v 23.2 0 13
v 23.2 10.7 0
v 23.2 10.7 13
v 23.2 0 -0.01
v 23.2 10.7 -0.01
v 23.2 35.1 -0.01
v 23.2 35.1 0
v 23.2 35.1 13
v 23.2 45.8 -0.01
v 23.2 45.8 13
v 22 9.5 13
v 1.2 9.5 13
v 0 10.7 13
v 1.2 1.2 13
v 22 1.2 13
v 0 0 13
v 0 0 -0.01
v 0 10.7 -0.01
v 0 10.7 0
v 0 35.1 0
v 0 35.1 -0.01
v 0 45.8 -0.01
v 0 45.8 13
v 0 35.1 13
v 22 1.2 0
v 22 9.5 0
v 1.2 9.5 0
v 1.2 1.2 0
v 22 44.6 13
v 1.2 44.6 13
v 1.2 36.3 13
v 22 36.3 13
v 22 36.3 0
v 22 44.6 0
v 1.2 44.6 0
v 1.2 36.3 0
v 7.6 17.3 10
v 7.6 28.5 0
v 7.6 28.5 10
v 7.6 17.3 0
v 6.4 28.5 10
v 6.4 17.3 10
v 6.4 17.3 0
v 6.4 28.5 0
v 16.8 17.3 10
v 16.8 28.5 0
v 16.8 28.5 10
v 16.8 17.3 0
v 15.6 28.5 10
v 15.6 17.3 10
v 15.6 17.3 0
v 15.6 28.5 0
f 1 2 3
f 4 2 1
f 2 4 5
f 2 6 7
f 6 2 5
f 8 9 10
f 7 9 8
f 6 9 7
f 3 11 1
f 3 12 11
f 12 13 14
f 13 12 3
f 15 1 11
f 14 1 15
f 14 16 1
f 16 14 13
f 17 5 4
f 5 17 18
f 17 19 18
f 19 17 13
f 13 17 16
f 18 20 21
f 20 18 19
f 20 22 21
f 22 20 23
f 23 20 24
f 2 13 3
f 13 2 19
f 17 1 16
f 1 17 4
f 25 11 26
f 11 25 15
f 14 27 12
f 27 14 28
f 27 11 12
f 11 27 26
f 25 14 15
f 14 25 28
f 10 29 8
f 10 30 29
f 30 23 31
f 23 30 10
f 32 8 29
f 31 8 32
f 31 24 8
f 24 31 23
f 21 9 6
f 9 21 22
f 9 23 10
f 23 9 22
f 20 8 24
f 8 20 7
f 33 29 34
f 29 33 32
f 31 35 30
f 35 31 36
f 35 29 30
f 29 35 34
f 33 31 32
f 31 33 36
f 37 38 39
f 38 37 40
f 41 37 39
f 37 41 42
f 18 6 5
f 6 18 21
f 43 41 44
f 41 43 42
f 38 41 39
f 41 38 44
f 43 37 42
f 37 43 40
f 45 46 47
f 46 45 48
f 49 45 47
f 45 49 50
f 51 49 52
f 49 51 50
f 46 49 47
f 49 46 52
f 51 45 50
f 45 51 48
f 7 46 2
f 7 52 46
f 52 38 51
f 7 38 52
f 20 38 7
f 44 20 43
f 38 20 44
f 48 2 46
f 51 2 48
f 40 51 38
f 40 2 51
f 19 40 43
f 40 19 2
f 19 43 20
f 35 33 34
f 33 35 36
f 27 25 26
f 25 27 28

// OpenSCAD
// file: ../Base/Boxes.scad
// Fischertechnik Box Foundation
// Pre-designed Boxes

use <Constants.scad>

include <PlacementOptions.scad>

box190Width = 190;
box190Depth = 130;
box130Width = 130;
box130Depth = 95;
boxUsageHeight = 33.9;
boxWallThickness = 2.4;
boxBaseThickness = 1.0;

// getBoxWallThickness()
// Gets the wall thickness of a Fischertechnik Box

function getBoxWallThickness() = boxWallThickness;

// Gets the usable height of a fischertechnik box
function getBoxUsageHeight() = boxUsageHeight;

// Gets the thickness of the Fischertechnik box base.
function getBoxBaseThickness() = boxBaseThickness;

// Gets the usable inner space of a Box 190 as an x/y-list
function getBox190Space() = [
    box190Width - 2*getBoxWallThickness(), 
    box190Depth - 2*getBoxWallThickness() ];

// Imports the Fischertechnik empty box 130x190 mm and places it at position 0,0
// 190x130 are the outer sizes, the inner space is slightly smaller. Use getBox190Space() to get the inner sizes.
// This module needs the STL file "Fischertechnik Box 130x190.stl" in the library path.
// The box is positioned that the usable inner space is at the 0,0,0 position. The

module Box190() {
    translate([-getBoxWallThickness(),-getBoxWallThickness(),-getBoxBaseThickness()])
        import("Fischertechnik Box 130x190.stl", convexity=3);
}

// Gets the usable inner space of a Box 130 as an x/y-list
function getBox130Space() = [
    box130Width - 2*getBoxWallThickness(), 
    box130Depth - 2*getBoxWallThickness() ];

// Imports the Fischertechnik empty box 95x130 mm and places it at position 0,0
// 190x130 are the outer sizes, the inner space is slightly smaller. Use getBox190Space() to get the inner sizes.
// This module needs the STL file "Fischertechnik Box 95x130.stl" in the library path.
// The box is positioned that the usable inner space is at the 0,0,0 position. The

module Box130() {
    translate([-getBoxWallThickness(),-getBoxWallThickness(),-getBoxBaseThickness()])
        import("Fischertechnik Box 95x130.stl", convexity=3);
}

// Creates a web at the specified box walls
// corner 0 = LowerLeft, 1 = UpperLeft, 2 = UpperRight, 3 = LowerRight
// side 0 = LeftOfCorner, 1 = RightOfCorner
// distance = Distance in mm from the corner
// box = inner width and depth of the box (default: Box 190)
// webWidth = length of the web (default is 3 mms)
// webThickness = thickness of the web (default is 1 mm)

module BoxWeb(corner, side, distance, box=getBox190Space(), webWidth=3, webThickness=1.0) {
    sink = getBoxWallThickness()/2;

    width = (corner % 2 == 0) ? 
            (side == LeftOfCorner ? webWidth : webThickness) :
            (side == LeftOfCorner ? webThickness : webWidth);

    depth = (corner % 2 == 0) ? 
            (side == RightOfCorner ? webWidth : webThickness) :
            (side == RightOfCorner ? webThickness : webWidth);
    
    xDiff = corner == LowerLeft ? 
                (side == LeftOfCorner ? -sink : distance) :
            (corner == UpperLeft ?                
                (side == LeftOfCorner ? distance : -sink) :
            (corner == UpperRight ?
                (side == LeftOfCorner ? box.x-webWidth+sink : box.x-distance-webThickness) :
                (side == LeftOfCorner ? box.x-distance-webThickness: box.x-webWidth+sink)));

    yDiff = corner == LowerLeft ? 
                (side == RightOfCorner ? -sink : distance) :
            (corner == UpperLeft ?
                (side == RightOfCorner ? box.y-distance : box.y-webWidth+sink) :
            (corner == UpperRight ?
                (side == RightOfCorner ? box.y-webWidth+sink : box.y-distance) :
                (side == RightOfCorner ? distance : -sink)));
    
    translate([xDiff, yDiff, -getExcess()])
        cube([width, depth, boxUsageHeight + 2*getExcess()]);
}
// file: ../Base/Rotation.scad
// Fischertechnik Box Foundation
// Geometry Helpers Rotation

include <PlacementOptions.scad>

// getRotatedSpace(space, rotation=NoRotation)
// Rotates the space dependent on the specified rotation

function getRotatedSpace(space, rotation=NoRotation) = [
    (rotation == Rotate90 || rotation == Rotate270) ? space.y : space.x,
    (rotation == Rotate90 || rotation == Rotate270) ? space.x : space.y
];

// Rotates the given space around the fixed left lower corner
// space = the space the children needs as width/depth list [width,depth]
// rotation = 0 Rotate0 degrees, 1 Rotate90 degrees, 2 Rotate180 degrees, 3 Rotate270 degrees (equivalent to -90)

module RotateFix(space, rotation=Rotate0) {
    dy = (rotation == Rotate0 || rotation == Rotate270) ? 0 :
        (rotation == Rotate90) ? space.x :
        space.y;
    dx = (rotation < Rotate180) ? 0 :
        (rotation == Rotate180) ? space.x :
        space.y;
    
    translate([dx, dy, 0])
        rotate([0, 0, rotations[rotation]])
            children();
}
// file: ../Base/Alignment.scad
// Fischertechnik Box Foundation
// Geometry Helpers Alignment

include <PlacementOptions.scad>

// getAlignedX(elementWidth, spaceWidth, align=AlignRight, offset=0)
// Gets the aligned X offset of an element with the given
// width in the given space.
// elementWidth = The width of the element to positon
// spaceWidth = The space where the element should be aligned
// align = 0 AlignLeft, 1 AlignCenter, 2 AlignRight
// offset = an optional offset from the aligned position. When
// aligned left or centered, then positive values are in X direction.
// When aligned right then positive values are in negative X direction.

function getAlignedX(elementWidth, spaceWidth, align=AlignRight, offset=0) =
    (align == AlignLeft) ?
        offset :
        ((align == AlignCenter) ?
        (spaceWidth - elementWidth)/2 + offset :
        spaceWidth - offset - elementWidth);

// getAlignedY(elementDepth, spaceDepth, align=AlignTop, offset=0)
// Gets the aligned Y offset of an element with the given
// depth in the given space.
// elementDepth = The depth of the element to positon
// spaceDepth = The space where the element should be aligned
// align = 0 AlignBottom, 1 AlignCenter, 2 AlignTop
// offset = an optional offset from the aligned position. When
// aligned bottom or centered, then positive values are in Y direction.
// When aligned top then positive values are in negative Y direction.

function getAlignedY(elementDepth, spaceDepth, align=AlignTop, offset=0) =
    (align == AlignBottom) ?
        offset :
        ((align == AlignCenter) ?
        (spaceDepth - elementDepth)/2 + offset :
        spaceDepth - offset - elementDepth);
// file: ../Base/PlacementOptions.scad
// Fischertechnik Box Foundation
// Placement Options

// Alignment
NoAlign = 0;
AlignLeft = 1;
AlignBottom = 2;
AlignCenter = 3;
AlignRight = 4;
AlignTop = 5;

// Element rotation degree steps
rotations = [0, -90, -180, -270];

// Rotation
NoRotation = 0;
Rotate0 = 0;
Rotate90 = 1;
Rotate180 = 2;
Rotate270 = 3;

// Docking (seen from above)
NoDock = -1;
DockLeft = 0;
DockTop = 1;
DockRight = 2;
DockCorner = 2;
DockBottom = 3;

// Web corners
LowerLeft = 0;
UpperLeft = 1;
UpperRight = 2;
LowerRight = 3;

// Web position relative to corner
LeftOfCorner = 0;
RightOfCorner = 1;
// file: ../Base/Placement.scad
// Fischertechnik Box Foundation
// Geometry Helpers Placement

use <Constants.scad>
use <Alignment.scad>
use <Rotation.scad>
use <Boxes.scad>

include <PlacementOptions.scad>

// Place(x=0, y=0, elementSpace=[0,0], alignX=AlignLeft, alignY=AlignBottom, rotation=Rotate0, boxSpace=getBox190Space())
// Places the child at the specified position
// y = Y-Position. This is a relative position when an X aligment is specified.
// x = X-Position. This is a relative position when an Y aligment is specified.
// elementSpace = space of the element to be placed [x,y]
// alignX = -1=NoAlign, 0 AlignLeft, 1 AlignCenter, 3 AlignRight (elementSpace and boxSpace required!)
// alignY = -1=NoAlign, 2 AlignBottom, 1 AlignCenter, 4 AlignTop (elementSpace and boxSpace required!)
// rotation = 0 Rotate0 0 degrees, 1 Rotate90 90 degrees, 
// 2 Rotate180 180 degrees, 3 Rotate270 270 degrees (equivalent to -90)
// boxSpace = Inner space of the box where the placement occurs [x,y] - default is Box 190x130 inner space

module Place(x=0, y=0, elementSpace=[0,0], 
  alignX=AlignLeft, alignY=AlignBottom, 
  rotation=NoRotation, boxSpace=getBox190Space()) {

    module Position(x, y, space, rotation=Rotate0) {
        translate([x, y, 0])
            RotateFix(space, rotation)
                children(0);
    }

    space = getRotatedSpace(elementSpace, rotation);
    alignedX = getAlignedX(space.x, boxSpace.x, alignX, x);
    alignedY = getAlignedY(space.y, boxSpace.y, alignY, y);
    Position(alignedX, alignedY, elementSpace, rotation)
        children(0);
}

// Center(space=getBox130Space(), elementSpace=[0,0])
// space = Space where the children is centered. For cylinder use centered=true and no elementSpace.
// elementSpace = space of the element to be centered [x,y]

module Center(space=getBox190Space(), elementSpace=[0,0]) {
    translate([(space.x - elementSpace.x) / 2, (space.y - elementSpace.y) / 2])
        children(0);
}

// CenterHorizontal(width=0, y=0, offset=0, space=getBox130Space())
// space = Space where the children is centered. For cylinder use centered=true and no elementSpace.
// elementSpace = space of the element to be centered [x,y]

module CenterHorizontal(width=0, y=0, offset=0, space=getBox190Space()) {
    translate([(space.x - width) / 2 + offset, y])
        children(0);
}

// CenterVertical(depth=0, x=0, offset=0, space=getBox130Space())
// space = Space where the children is centered. For cylinder use centered=true and no elementSpace.
// elementSpace = space of the element to be centered [x,y]

module CenterVerticalal(depth=0, x=0, offset=0, space=getBox190Space()) {
    translate([x, (space.y - depth) / 2 + offset])
        children(0);
}
// file: ../Base/Constants.scad
// Fischertechnik Box Foundation
// Constants

// Constant values necessary for multiple elements

// Base constants
dividerThickness = 1.2;
excess = 0.01;
fragments = 90;
tolerance = 0.8;

// Gets the thickness of a divider 
function getDividerThickness() = dividerThickness;

// Gets the excess that is used to merge walls into each other
function getExcess() = excess;

// Gets amount of fragments of a cylinder
function getFragments() = fragments;

// Gets the inner tolerance of a frame to each side
function getTolerance() = tolerance;


// Fischertechnik specific constants
axisDiameter = 4;
axisBottomDiameter = axisDiameter + 1;
standardEdgeDistance = 2.5;
standardWebDistance = 11.5;
standardCornerLength = 15;
tubeWallFactor = 1.6;

// Gets axis diameter
function getAxisDiameter() = axisDiameter;

// Gets axis bottom diameter for thicker part at the bottom
function getAxisBottomDiameter() = axisBottomDiameter;

// gets the standard distance to the wall of the box for dockable frames with webs
function getStandardEdgeDistance() = standardEdgeDistance;

// gets the standard distance of each web to the corner of the dockable frame
function getStandardWebDistance() = standardWebDistance;

// gets the standard length of the corner walls of a dockable frame
function getStandardCornerLength() = standardCornerLength;

// gets the wall thickness of a tube.
function getTubeWallThickness() = tubeWallFactor * getDividerThickness();
// file: FrameLockingRing.scad
// Fischertechnik Box Library
// Frame for Locking Ring
// 31020

use <../Base/Constants.scad>
use <../ModelBase/Simple.scad>

width = 20;
depth = 7.5;
height = 13;

// getFrameLockingRingSpace(columns=1, rows=1)
// columns = Count of locking rings in X direction (width of ring)
// rows = Count of locking rings in Y direction (depth of ring)
// Gets the space the frame locking ring needs as width (.x and .y as a list)

function getFrameLockingRingSpace(columns=1, rows=1) = getFrameOuterVolume([width*columns, depth*rows, height]);

// FrameLockingRing(columns, rows, smallSideIsX)
// columns = Count of locking rings in X direction (width of ring)
// rows = Count of locking rings in Y direction (depth of ring)
// The walls of the frame are 13 mm high. The small side is 7.5 mm wide, the large side
// is 20 mm wide.

module FrameLockingRing(columns=1, rows=1) {
    Frame([width*columns, depth*rows, height]);
}

// Tests
color("lightgray")
    FrameLockingRing(1);
// file: HolderWinchDrum.scad
// Fischertechnik Box Library
// Holder for Winch Drum
// 31016

use <../Base/Constants.scad>
use <../Base/Placement.scad>
use <../ModelBase/Simple.scad>

width = 20;
depth = 25;
height = 10;

// getWinchDrumHolderSpace()
// Gets the space the winch drum holder needs as width and depth (.x and .y as a list)

function getHolderWinchDrumSpace() = [width, depth, height];

// HolderWinchDrum()
// Two walls for holding the 31016 winch drum.

module HolderWinchDrum() {
    holderDepth = 11.2;
    holderDistance = 8;
    
    Space(getHolderWinchDrumSpace());
    
    module Holders() {
        Wall([getDividerThickness(), holderDepth, height]);
        translate([holderDistance + getDividerThickness(), 0])
            Wall([getDividerThickness(), holderDepth, height]);
    }
    
    Center(getHolderWinchDrumSpace(), [holderDistance + 2*getDividerThickness(), holderDepth]) {
        Holders();
    }
}

// Tests
color("lightgray")
HolderWinchDrum();
// main file
// Fischertechnik Box Library
// Complete Winch Drum with Locking Rings
// 31018 + 2 x 31020

use <../ModelBase/Simple.scad>
use <HolderWinchDrum.scad>
use <FrameLockingRing.scad>

distance = 24.4;

// getHolderWinchDrumWithLockingRingsSpace()
// Gets the space the holder winch drum with locking rings needs as width (.x and .y as a list)

function getHolderWinchDrumWithLockingRingsSpace() = [
    getFrameLockingRingSpace().x, 
    getFrameLockingRingSpace().y * 2 + distance,
    getFrameLockingRingSpace().z];

// HolderWinchDrumWithLockingRings
// Combination of a winch drum holder with two locking ring holders at both ends

module HolderWinchDrumWithLockingRings() {    
    yOffsetFrame = distance + getFrameLockingRingSpace()[1];
    
    Space(getHolderWinchDrumWithLockingRingsSpace());
    
    FrameLockingRing();
    translate([0, yOffsetFrame, 0])
        FrameLockingRing();
    
    xOffset = (getFrameLockingRingSpace()[0] - getHolderWinchDrumSpace()[0]) / 2;
    yOffset = (distance + 2 * getFrameLockingRingSpace()[1] - getHolderWinchDrumSpace()[1]) / 2;
    
    translate([xOffset, yOffset, 0])
        HolderWinchDrum();
}

// Tests
color("lightgray")
HolderWinchDrumWithLockingRings();
